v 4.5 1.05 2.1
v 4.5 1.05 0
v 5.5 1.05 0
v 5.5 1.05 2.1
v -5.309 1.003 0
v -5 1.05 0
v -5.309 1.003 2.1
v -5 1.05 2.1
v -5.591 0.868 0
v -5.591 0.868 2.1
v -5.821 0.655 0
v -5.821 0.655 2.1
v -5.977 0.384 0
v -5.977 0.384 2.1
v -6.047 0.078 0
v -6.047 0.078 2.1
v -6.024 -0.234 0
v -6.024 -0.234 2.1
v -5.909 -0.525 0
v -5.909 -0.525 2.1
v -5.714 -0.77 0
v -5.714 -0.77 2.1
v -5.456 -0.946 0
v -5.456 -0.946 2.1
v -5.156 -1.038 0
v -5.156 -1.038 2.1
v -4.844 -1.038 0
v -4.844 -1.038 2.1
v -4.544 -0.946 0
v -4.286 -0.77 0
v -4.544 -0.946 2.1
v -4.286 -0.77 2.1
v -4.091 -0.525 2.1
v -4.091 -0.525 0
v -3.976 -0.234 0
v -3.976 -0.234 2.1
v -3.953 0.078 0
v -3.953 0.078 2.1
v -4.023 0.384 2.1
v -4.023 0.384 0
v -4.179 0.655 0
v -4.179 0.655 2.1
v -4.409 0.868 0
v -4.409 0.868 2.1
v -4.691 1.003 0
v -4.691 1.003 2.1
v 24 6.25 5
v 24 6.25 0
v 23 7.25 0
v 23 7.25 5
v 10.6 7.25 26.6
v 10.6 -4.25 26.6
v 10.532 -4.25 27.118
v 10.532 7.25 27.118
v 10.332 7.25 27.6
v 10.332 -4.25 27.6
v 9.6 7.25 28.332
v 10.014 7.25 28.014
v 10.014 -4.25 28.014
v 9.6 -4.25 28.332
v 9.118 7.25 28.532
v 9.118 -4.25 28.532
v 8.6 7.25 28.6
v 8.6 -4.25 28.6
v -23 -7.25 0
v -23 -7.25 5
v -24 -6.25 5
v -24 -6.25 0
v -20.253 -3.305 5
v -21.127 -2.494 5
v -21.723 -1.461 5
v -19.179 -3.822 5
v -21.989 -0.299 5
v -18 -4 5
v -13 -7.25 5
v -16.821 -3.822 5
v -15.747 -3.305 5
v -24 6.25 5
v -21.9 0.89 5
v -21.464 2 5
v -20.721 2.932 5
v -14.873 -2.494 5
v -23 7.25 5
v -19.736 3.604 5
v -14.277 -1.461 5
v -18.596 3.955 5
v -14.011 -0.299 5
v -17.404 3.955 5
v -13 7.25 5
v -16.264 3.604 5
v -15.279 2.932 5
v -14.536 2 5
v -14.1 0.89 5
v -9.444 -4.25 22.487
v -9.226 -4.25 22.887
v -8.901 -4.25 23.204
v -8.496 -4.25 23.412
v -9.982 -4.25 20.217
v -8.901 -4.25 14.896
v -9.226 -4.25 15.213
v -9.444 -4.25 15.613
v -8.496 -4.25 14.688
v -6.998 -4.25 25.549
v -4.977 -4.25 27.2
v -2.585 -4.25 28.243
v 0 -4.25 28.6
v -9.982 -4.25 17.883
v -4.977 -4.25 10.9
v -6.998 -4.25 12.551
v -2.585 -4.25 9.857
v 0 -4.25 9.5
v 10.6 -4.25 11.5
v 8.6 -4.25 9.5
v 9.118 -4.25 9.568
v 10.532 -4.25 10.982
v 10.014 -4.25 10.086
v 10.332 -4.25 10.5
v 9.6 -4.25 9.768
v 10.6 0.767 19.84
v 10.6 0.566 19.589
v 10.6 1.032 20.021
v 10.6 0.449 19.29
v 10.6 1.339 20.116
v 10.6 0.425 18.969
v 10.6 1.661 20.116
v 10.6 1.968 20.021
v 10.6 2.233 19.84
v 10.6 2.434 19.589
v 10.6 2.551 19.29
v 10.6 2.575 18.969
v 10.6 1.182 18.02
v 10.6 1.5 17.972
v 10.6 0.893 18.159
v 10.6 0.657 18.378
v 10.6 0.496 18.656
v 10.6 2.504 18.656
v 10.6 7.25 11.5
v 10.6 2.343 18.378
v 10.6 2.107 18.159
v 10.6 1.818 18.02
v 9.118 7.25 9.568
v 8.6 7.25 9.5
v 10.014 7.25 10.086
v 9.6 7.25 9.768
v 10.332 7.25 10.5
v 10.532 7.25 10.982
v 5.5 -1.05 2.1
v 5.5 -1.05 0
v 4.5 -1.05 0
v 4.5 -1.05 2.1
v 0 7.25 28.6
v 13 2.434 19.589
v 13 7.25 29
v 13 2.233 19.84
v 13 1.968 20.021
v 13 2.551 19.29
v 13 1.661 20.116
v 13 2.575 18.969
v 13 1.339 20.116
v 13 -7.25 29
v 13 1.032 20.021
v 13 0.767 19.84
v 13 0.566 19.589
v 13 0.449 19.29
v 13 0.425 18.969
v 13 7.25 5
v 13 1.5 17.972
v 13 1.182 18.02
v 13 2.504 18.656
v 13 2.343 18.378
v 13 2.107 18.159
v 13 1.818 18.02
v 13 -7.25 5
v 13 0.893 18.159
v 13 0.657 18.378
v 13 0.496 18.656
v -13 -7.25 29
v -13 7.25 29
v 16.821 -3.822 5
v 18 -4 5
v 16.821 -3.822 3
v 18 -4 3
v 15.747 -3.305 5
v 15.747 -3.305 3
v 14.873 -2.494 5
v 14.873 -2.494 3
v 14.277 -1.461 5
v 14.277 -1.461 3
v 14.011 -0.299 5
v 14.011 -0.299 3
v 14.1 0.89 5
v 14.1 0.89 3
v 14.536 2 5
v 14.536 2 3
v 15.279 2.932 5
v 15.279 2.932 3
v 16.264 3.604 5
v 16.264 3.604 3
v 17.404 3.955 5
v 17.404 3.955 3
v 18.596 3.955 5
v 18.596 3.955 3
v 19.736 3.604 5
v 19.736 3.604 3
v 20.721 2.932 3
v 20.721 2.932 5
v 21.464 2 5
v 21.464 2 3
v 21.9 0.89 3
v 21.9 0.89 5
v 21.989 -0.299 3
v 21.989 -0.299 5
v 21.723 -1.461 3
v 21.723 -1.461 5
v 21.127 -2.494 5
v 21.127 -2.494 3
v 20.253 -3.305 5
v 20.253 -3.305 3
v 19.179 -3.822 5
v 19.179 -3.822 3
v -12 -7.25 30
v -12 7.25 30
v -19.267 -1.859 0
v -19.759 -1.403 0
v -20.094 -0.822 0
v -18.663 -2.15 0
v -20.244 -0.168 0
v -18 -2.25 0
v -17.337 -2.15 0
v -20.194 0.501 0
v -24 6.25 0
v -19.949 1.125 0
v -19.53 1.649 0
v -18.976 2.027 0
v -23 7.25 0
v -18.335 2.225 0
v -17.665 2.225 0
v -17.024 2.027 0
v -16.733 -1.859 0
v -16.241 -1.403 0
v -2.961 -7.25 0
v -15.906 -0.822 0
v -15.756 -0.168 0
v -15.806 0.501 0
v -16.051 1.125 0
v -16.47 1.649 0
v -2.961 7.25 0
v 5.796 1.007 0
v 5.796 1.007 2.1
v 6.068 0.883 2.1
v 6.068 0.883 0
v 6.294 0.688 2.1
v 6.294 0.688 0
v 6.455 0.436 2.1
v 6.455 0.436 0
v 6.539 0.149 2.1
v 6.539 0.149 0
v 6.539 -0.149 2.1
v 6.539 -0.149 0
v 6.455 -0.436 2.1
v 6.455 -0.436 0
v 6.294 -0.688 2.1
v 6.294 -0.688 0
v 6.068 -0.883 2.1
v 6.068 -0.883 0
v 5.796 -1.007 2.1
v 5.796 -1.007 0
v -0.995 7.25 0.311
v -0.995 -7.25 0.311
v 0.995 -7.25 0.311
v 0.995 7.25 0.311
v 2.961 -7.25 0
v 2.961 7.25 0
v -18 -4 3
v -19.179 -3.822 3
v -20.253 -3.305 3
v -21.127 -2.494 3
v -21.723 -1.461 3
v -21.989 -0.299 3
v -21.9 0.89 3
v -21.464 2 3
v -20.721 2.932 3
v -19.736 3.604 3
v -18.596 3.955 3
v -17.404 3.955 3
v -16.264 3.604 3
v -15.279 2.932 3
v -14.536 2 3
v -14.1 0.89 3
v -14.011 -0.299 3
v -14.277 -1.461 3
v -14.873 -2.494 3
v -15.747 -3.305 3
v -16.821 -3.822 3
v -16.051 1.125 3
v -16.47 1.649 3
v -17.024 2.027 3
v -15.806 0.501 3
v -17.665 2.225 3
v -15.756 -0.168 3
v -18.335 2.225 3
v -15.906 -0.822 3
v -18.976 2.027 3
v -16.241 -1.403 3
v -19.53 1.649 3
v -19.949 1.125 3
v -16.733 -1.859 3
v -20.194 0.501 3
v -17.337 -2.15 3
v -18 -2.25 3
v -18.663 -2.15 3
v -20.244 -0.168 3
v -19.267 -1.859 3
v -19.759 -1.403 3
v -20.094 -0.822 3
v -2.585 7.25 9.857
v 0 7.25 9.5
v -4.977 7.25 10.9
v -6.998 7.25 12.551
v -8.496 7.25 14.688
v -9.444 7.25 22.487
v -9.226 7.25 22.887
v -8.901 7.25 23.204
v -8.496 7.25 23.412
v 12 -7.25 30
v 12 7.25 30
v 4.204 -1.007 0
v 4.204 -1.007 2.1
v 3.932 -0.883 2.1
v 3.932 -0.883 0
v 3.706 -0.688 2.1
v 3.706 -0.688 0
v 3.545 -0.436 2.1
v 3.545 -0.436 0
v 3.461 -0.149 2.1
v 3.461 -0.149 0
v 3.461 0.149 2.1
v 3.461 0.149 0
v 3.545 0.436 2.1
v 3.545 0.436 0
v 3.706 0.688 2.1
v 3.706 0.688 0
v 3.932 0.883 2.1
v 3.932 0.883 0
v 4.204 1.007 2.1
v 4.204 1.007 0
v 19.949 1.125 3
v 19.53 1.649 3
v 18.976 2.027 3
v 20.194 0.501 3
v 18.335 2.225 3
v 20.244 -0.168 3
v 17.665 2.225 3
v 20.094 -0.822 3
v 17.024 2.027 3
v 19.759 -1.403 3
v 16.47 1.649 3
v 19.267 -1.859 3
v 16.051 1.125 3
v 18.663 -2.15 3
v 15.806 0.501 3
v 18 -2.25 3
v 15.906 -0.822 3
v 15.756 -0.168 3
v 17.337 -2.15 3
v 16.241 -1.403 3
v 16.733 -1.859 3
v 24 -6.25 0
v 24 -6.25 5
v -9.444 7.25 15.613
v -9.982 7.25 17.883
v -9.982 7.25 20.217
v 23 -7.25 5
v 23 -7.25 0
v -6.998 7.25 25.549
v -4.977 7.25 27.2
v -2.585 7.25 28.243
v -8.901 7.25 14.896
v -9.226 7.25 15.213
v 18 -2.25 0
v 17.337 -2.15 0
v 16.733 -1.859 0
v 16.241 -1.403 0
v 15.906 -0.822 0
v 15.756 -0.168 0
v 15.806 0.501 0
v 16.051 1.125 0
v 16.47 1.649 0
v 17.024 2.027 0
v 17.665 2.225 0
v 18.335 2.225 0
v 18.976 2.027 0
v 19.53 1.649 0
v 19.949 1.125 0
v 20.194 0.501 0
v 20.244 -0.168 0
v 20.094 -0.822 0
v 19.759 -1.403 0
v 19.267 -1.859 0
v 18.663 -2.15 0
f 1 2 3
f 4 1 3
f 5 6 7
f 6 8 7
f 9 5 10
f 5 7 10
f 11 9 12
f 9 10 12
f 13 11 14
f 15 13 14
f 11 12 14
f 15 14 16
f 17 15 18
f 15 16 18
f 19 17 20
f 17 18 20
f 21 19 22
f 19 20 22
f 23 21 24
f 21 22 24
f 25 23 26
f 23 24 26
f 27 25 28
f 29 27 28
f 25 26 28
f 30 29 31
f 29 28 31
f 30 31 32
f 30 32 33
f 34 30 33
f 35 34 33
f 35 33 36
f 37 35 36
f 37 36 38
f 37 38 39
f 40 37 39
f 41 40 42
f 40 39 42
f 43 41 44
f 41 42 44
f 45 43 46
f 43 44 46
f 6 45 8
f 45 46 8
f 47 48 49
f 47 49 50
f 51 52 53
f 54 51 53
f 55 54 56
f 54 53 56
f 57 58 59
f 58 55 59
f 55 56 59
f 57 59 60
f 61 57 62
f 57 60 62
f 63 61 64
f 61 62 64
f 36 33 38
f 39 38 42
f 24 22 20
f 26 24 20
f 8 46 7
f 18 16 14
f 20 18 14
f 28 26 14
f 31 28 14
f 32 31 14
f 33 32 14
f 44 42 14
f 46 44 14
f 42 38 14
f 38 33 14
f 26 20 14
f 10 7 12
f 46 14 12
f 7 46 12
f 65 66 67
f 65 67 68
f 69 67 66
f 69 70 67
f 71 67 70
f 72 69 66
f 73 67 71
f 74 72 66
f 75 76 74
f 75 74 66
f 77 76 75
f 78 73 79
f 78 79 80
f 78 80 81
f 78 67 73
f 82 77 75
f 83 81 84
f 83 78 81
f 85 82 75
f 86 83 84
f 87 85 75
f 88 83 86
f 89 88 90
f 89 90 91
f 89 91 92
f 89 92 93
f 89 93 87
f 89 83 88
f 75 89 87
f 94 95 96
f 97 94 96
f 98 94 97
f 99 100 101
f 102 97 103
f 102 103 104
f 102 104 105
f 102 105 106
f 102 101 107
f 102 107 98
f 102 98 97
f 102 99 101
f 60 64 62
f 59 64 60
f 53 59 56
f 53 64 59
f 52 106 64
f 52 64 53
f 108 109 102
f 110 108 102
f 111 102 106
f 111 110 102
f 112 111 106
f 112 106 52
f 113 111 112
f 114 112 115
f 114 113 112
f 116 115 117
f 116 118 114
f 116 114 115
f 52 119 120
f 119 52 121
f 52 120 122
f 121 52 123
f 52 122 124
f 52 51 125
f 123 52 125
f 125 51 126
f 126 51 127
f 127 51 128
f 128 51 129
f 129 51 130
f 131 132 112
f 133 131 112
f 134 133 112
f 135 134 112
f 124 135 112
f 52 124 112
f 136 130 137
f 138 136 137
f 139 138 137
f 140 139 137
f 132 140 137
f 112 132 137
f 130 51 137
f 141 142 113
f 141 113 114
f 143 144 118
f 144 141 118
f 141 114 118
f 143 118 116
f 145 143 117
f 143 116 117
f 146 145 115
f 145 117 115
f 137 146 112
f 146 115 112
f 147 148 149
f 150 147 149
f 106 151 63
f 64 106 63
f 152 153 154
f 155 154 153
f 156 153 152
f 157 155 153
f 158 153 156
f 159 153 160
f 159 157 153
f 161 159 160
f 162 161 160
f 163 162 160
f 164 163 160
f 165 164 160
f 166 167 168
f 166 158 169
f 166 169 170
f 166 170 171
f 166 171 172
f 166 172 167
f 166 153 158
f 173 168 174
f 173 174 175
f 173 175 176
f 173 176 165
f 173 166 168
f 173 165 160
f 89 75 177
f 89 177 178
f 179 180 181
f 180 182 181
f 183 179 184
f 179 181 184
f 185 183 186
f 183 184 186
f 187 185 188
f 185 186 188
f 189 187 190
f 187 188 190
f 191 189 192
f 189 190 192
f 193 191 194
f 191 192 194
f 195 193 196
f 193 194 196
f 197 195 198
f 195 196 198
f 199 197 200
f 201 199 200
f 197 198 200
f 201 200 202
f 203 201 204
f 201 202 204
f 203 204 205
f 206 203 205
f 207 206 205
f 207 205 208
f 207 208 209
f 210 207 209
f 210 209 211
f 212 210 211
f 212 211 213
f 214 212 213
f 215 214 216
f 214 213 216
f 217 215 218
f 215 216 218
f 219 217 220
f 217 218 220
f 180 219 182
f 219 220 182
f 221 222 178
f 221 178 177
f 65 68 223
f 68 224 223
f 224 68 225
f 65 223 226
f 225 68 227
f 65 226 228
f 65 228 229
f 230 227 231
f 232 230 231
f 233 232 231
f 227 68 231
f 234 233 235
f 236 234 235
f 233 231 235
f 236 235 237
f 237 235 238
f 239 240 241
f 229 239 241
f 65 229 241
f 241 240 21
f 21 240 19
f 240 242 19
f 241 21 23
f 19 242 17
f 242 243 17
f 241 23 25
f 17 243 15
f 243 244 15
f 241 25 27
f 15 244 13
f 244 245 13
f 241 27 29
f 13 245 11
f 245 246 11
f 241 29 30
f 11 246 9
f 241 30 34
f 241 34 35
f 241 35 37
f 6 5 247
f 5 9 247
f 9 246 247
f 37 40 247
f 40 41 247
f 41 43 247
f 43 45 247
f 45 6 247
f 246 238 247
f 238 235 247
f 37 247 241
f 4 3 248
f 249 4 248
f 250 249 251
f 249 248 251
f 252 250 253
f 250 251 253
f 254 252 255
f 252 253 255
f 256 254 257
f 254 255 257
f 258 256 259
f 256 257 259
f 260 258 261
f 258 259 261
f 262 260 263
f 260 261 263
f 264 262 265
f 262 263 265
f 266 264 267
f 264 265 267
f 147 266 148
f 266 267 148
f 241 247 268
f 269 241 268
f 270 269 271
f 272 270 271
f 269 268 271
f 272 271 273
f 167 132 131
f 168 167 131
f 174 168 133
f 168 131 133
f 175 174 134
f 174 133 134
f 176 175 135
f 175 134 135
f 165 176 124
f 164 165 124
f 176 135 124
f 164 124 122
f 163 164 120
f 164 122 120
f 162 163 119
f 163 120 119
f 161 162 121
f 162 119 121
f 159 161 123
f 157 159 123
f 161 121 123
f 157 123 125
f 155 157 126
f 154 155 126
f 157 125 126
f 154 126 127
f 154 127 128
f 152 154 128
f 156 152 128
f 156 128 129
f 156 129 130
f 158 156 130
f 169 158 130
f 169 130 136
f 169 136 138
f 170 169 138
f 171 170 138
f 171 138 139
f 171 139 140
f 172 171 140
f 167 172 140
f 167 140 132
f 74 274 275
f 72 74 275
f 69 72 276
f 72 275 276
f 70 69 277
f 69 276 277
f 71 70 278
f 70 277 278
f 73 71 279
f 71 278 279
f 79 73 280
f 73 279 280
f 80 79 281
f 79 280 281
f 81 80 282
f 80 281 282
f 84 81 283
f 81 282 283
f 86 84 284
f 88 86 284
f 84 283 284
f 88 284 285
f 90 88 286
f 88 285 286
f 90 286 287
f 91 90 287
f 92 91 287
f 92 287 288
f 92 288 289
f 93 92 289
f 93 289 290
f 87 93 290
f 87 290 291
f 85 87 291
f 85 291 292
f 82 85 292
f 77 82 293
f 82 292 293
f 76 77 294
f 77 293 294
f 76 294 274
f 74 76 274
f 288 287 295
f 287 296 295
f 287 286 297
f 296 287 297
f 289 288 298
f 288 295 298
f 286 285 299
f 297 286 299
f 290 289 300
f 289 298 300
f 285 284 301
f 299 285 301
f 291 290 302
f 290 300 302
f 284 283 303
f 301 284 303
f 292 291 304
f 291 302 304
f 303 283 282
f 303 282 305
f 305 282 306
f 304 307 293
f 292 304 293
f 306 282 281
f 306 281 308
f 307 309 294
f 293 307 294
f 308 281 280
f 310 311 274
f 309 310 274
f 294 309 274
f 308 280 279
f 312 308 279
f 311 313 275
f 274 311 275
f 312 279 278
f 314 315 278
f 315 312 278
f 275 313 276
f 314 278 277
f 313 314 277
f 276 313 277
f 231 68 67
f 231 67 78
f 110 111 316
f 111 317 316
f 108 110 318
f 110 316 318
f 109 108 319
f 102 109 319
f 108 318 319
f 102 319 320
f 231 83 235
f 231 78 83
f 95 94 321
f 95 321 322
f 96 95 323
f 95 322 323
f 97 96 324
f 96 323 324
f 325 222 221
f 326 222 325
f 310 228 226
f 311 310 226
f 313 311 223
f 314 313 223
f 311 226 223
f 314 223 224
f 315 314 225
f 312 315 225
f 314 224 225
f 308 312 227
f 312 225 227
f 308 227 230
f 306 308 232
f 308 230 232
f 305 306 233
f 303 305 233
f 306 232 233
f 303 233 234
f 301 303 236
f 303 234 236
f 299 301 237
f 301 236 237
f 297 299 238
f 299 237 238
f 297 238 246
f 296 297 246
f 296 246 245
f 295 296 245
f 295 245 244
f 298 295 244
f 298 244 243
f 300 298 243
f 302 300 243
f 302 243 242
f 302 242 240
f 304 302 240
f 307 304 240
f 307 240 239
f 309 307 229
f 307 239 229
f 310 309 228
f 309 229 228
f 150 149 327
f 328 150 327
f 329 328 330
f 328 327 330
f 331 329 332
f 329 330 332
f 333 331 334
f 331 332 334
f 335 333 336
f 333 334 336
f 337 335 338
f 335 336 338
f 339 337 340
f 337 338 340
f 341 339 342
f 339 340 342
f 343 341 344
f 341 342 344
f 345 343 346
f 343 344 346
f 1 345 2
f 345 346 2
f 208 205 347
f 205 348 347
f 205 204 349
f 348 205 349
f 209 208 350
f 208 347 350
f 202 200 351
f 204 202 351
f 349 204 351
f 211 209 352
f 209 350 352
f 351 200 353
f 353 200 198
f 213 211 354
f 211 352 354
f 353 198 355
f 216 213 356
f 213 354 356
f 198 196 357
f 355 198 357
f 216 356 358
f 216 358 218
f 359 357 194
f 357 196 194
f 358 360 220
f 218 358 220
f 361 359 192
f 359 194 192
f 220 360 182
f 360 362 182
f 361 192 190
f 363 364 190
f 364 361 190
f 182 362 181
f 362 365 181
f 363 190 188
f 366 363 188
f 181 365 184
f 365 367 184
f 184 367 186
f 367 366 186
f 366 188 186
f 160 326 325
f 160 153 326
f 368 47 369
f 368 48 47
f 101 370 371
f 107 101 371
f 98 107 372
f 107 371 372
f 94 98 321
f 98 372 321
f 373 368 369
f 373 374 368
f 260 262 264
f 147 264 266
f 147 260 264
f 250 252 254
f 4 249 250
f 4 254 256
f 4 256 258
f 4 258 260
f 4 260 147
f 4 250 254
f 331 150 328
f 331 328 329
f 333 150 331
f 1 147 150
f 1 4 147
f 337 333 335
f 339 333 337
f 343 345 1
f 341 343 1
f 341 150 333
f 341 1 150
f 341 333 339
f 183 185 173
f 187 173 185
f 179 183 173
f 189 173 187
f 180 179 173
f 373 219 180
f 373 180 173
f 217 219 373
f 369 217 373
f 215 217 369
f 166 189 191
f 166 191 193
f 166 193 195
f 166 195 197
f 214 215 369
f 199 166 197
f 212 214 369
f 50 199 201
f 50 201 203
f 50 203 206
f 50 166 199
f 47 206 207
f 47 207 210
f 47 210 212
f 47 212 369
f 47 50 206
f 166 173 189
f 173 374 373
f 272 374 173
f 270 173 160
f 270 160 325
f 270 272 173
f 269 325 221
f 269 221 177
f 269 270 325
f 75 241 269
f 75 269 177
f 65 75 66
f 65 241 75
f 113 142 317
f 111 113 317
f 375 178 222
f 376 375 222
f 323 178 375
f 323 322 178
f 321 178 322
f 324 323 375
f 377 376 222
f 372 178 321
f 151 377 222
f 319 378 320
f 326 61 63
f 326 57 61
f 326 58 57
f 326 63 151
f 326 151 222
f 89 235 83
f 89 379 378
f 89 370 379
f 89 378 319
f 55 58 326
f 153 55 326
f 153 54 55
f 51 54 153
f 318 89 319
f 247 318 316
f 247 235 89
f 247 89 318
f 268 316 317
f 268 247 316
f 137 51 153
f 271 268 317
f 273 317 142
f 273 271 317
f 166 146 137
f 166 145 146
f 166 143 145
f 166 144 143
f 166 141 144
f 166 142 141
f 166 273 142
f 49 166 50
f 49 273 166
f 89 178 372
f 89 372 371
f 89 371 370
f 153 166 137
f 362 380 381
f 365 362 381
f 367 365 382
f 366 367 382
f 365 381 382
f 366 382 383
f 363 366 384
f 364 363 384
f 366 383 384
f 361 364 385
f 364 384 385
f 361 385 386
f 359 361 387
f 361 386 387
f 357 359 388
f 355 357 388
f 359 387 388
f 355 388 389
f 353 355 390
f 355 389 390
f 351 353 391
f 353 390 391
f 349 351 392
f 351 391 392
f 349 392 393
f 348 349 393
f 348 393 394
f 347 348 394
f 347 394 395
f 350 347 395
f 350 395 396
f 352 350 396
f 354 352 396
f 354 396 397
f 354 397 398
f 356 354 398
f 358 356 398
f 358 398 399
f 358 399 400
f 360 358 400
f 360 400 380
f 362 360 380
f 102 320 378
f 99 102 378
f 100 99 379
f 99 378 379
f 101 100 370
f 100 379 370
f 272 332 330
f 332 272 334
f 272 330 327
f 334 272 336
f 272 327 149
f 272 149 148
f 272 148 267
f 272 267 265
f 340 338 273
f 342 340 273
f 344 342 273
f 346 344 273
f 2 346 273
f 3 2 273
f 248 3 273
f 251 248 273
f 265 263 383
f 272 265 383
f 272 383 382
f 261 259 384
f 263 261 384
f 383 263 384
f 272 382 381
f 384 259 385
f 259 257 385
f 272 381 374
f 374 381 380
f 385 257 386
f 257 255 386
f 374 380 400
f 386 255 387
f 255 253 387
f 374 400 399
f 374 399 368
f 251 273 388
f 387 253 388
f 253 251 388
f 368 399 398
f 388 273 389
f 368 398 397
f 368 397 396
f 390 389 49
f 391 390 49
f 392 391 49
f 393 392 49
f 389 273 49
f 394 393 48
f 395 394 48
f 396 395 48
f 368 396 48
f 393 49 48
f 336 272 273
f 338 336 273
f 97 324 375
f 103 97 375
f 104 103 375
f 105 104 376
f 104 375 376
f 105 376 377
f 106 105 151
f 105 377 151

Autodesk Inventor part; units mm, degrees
ref_plane "YZ Plane" through (0, 0, 0) normal (1, 0, 0) x (0, 1, 0)
ref_plane "XZ Plane" through (0, 0, 0) normal (0, 1, 0) x (-1, 0, 0)
ref_plane "XY Plane" through (0, 0, 0) normal (0, 0, 1) x (1, 0, 0)
sketch "Sketch1" plane through (0, 0, 0) normal (0, 0, 1) x (1, 0, 0)
  line L0 (-24, 7.25) -> (24, 7.25)
  line L1 (24, 7.25) -> (24, -7.25)
  line L2 (24, -7.25) -> (-24, -7.25)
  line L3 (-24, -7.25) -> (-24, 7.25)
  point P0 (0, 0)
  dimension "LENGTH" = 48
  dimension "WIDTH" = 14.5
  dimension "d0" = 7.25
  dimension "d3" = 24
extrude "Extrusion1" add sketch "Sketch1" along normal blind 5
sketch "Sketch3" plane through (0, 0, 5) normal (0, 0, 1) x (1, 0, 0)
  line L0 (-24, 7.25) -> (-24, -7.25) projected
  line L1 (24, -7.25) -> (24, 7.25) projected
  point P0 (0, 0)
  point P1 (-18, 0)
  point P2 (18, 0)
  dimension "d13" = 0
  dimension "d14" = 0
  dimension "d15" = 6
  dimension "d16" = 6
hole "Hole1" at (-18, 0, 5) at (18, 0, 5) direction (0, 0, -1) diameter 4.5 depth 5 counterbore diameter 8 counterbore depth 2 clearance for "Socket Head Cap Screw" size "#8" standard "Ansi Unified Screw Threads"
sketch "Sketch4" plane through (0, 0, 5) normal (0, 0, 1) x (1, 0, 0)
  line L0 (-13, 7.25) -> (13, 7.25)
  line L1 (13, 7.25) -> (13, -7.25)
  line L2 (13, -7.25) -> (-13, -7.25)
  line L3 (-13, -7.25) -> (-13, 7.25)
  point P0 (0, 0)
  dimension "d17" = 26
  dimension "d18" = 13
  dimension "d19" = 14.5
  dimension "d20" = 7.25
extrude "Extrusion2" add sketch "Sketch4" along normal blind 25
sketch "Sketch5" plane through (-24, 7.25, 0) normal (0, 1, 0) x (1, 0, 0)
  circle A0 centre (24, -19.05) radius 9.55
  line L0 (14.475, -19.05) -> (33.525, -19.05)
  line L1 (24, -28.6) -> (34.6, -28.6)
  line L2 (34.6, -28.6) -> (34.6, -9.5)
  line L3 (34.6, -9.5) -> (24, -9.5)
  line L4 (24, -9.5) -> (24, -28.6)
  circle A1 centre (24, -19.05) radius 10.05
  circle A2 centre (15.9891, -16.1343) radius 1.525
  circle A3 centre (15.9891, -21.9657) radius 1.525
  line L5 (24, -19.05) -> (15.9891, -16.1343)
  line L6 (15.9891, -21.9657) -> (24, -19.05)
  point P0 (24, 0)
  point P1 (24, -28.6)
  point P2 (24, -9.5)
  point P3 (15.5042, -14.6884)
  point P4 (14.5561, -15.6127)
  point P5 (14.5561, -22.4873)
  point P6 (15.5042, -23.4116)
  dimension "d23" = 0
  dimension "d24" = 19.05
  dimension "DIAMETER" = 19.1
  dimension "d26" = 0
  dimension "d30" = 10.6
  dimension "d31" = 0
  dimension "d32" = 9.55
  dimension "d33" = 9.55
  dimension "d48" = 20.1
  dimension "d49" = 3.05
  dimension "d50" = 3.05
  dimension "d51" = 20
  dimension "d52" = 20
  dimension "d53" = 8.525
  dimension "d54" = 8.525
extrude "Extrusion3" cut sketch "Sketch5" against normal blind 11.5 contours A0 L4 | A0 L3 A1 L1 | L4 L5 A2 A0 | A0 A3 L6 L4 | A2 A0 | A0 A2 | L3 L2 L1 A1 | L6 A3 A0 A2 L5 | A3 A0 | A0 A3 | A0 A3 A1 A2
fillet "Fillet1" radius 2 2 edges at (10.6, 1.5, 28.6) (10.6, 1.5, 9.5)
sketch "Sketch6" plane through (13, -7.25, 5) normal (1, 0, 0) x (0, 0, -1)
  line L0 (0, 14.5) -> (-25, 14.5) projected
  point P0 (5, 7.25)
  point P1 (-14.05, 8.75)
  dimension "d46" = 19.05
  dimension "d47" = 5.75
hole "Hole2" at (13, 1.5, 19.05) direction (-1, 0, 0) diameter 2.1565 depth 2.4 thread size "4-40 UNC" class "2B" standard "ANSI Unified Screw Threads"
chamfer "Chamfer1" distance 1 angle 45 6 edges at (13, 0, 30) (-13, 0, 30) (-24, 7.25, 2.5) (-24, -7.25, 2.5) (24, 7.25, 2.5) (24, -7.25, 2.5)
sketch "Sketch7" plane through (0, 0, 0) normal (0, 0, -1) x (-1, 0, 0)
  line L0 (-5.5, 0) -> (-4.5, 0) construction
  line L1 (-5.5, -1.05) -> (-4.5, -1.05)
  line L2 (-4.5, 1.05) -> (-5.5, 1.05)
  arc A0 (-5.5, 1.05) -> (-5.5, -1.05) centre (-5.5, 0) ccw
  arc A1 (-4.5, -1.05) -> (-4.5, 1.05) centre (-4.5, 0) ccw
  point P0 (0, 0)
  point P1 (-5, 0)
  point P2 (5, 0)
  dimension "d58" = 1
  dimension "d59" = 1.05
  dimension "d60" = 10
  dimension "d61" = 0
  dimension "d62" = 0
  dimension "d63" = 5
hole "Hole3" at (-5, 0, 0) direction (0, 0, 1) diameter 2.1 depth 2.1
extrude "Extrusion4" cut sketch "Sketch7" against normal blind 2.1
sketch "Sketch8" plane through (-23, 7.25, 0) normal (0, 1, 0) x (1, 0, 0)
  circle A0 centre (23, 12.35) radius 12.7
  point P0 (23, 0)
  dimension "d73" = 0
  dimension "d74" = 12.35
  dimension "d75" = 25.4
extrude "Extrusion5" cut sketch "Sketch8" against normal up to surface (14.5 mm away)
equation "\"d0\" = 0.5 * WIDTH"
equation "\"d3\" = 0.5 * LENGTH"
equation "\"d18\" = 0.5 * d17"
equation "\"d19\" = WIDTH"
equation "\"d20\" = 0.5 * WIDTH"
equation "\"d24\" = BEAM_HEIGHT"
equation "\"d32\" = 0.5 * DIAMETER"
equation "\"d33\" = d32"
equation "\"d54\" = d53"
equation "\"d46\" = BEAM_HEIGHT"
equation "\"d47\" = 0.5 * DEPTH"
equation "\"TOLERANCE\" = 0.1"
equation "\"BEAM_HEIGHT\" = 19.05"
equation "\"DEPTH\" = 11.5"
properties part number "RC04FC-F01-mount-01"
